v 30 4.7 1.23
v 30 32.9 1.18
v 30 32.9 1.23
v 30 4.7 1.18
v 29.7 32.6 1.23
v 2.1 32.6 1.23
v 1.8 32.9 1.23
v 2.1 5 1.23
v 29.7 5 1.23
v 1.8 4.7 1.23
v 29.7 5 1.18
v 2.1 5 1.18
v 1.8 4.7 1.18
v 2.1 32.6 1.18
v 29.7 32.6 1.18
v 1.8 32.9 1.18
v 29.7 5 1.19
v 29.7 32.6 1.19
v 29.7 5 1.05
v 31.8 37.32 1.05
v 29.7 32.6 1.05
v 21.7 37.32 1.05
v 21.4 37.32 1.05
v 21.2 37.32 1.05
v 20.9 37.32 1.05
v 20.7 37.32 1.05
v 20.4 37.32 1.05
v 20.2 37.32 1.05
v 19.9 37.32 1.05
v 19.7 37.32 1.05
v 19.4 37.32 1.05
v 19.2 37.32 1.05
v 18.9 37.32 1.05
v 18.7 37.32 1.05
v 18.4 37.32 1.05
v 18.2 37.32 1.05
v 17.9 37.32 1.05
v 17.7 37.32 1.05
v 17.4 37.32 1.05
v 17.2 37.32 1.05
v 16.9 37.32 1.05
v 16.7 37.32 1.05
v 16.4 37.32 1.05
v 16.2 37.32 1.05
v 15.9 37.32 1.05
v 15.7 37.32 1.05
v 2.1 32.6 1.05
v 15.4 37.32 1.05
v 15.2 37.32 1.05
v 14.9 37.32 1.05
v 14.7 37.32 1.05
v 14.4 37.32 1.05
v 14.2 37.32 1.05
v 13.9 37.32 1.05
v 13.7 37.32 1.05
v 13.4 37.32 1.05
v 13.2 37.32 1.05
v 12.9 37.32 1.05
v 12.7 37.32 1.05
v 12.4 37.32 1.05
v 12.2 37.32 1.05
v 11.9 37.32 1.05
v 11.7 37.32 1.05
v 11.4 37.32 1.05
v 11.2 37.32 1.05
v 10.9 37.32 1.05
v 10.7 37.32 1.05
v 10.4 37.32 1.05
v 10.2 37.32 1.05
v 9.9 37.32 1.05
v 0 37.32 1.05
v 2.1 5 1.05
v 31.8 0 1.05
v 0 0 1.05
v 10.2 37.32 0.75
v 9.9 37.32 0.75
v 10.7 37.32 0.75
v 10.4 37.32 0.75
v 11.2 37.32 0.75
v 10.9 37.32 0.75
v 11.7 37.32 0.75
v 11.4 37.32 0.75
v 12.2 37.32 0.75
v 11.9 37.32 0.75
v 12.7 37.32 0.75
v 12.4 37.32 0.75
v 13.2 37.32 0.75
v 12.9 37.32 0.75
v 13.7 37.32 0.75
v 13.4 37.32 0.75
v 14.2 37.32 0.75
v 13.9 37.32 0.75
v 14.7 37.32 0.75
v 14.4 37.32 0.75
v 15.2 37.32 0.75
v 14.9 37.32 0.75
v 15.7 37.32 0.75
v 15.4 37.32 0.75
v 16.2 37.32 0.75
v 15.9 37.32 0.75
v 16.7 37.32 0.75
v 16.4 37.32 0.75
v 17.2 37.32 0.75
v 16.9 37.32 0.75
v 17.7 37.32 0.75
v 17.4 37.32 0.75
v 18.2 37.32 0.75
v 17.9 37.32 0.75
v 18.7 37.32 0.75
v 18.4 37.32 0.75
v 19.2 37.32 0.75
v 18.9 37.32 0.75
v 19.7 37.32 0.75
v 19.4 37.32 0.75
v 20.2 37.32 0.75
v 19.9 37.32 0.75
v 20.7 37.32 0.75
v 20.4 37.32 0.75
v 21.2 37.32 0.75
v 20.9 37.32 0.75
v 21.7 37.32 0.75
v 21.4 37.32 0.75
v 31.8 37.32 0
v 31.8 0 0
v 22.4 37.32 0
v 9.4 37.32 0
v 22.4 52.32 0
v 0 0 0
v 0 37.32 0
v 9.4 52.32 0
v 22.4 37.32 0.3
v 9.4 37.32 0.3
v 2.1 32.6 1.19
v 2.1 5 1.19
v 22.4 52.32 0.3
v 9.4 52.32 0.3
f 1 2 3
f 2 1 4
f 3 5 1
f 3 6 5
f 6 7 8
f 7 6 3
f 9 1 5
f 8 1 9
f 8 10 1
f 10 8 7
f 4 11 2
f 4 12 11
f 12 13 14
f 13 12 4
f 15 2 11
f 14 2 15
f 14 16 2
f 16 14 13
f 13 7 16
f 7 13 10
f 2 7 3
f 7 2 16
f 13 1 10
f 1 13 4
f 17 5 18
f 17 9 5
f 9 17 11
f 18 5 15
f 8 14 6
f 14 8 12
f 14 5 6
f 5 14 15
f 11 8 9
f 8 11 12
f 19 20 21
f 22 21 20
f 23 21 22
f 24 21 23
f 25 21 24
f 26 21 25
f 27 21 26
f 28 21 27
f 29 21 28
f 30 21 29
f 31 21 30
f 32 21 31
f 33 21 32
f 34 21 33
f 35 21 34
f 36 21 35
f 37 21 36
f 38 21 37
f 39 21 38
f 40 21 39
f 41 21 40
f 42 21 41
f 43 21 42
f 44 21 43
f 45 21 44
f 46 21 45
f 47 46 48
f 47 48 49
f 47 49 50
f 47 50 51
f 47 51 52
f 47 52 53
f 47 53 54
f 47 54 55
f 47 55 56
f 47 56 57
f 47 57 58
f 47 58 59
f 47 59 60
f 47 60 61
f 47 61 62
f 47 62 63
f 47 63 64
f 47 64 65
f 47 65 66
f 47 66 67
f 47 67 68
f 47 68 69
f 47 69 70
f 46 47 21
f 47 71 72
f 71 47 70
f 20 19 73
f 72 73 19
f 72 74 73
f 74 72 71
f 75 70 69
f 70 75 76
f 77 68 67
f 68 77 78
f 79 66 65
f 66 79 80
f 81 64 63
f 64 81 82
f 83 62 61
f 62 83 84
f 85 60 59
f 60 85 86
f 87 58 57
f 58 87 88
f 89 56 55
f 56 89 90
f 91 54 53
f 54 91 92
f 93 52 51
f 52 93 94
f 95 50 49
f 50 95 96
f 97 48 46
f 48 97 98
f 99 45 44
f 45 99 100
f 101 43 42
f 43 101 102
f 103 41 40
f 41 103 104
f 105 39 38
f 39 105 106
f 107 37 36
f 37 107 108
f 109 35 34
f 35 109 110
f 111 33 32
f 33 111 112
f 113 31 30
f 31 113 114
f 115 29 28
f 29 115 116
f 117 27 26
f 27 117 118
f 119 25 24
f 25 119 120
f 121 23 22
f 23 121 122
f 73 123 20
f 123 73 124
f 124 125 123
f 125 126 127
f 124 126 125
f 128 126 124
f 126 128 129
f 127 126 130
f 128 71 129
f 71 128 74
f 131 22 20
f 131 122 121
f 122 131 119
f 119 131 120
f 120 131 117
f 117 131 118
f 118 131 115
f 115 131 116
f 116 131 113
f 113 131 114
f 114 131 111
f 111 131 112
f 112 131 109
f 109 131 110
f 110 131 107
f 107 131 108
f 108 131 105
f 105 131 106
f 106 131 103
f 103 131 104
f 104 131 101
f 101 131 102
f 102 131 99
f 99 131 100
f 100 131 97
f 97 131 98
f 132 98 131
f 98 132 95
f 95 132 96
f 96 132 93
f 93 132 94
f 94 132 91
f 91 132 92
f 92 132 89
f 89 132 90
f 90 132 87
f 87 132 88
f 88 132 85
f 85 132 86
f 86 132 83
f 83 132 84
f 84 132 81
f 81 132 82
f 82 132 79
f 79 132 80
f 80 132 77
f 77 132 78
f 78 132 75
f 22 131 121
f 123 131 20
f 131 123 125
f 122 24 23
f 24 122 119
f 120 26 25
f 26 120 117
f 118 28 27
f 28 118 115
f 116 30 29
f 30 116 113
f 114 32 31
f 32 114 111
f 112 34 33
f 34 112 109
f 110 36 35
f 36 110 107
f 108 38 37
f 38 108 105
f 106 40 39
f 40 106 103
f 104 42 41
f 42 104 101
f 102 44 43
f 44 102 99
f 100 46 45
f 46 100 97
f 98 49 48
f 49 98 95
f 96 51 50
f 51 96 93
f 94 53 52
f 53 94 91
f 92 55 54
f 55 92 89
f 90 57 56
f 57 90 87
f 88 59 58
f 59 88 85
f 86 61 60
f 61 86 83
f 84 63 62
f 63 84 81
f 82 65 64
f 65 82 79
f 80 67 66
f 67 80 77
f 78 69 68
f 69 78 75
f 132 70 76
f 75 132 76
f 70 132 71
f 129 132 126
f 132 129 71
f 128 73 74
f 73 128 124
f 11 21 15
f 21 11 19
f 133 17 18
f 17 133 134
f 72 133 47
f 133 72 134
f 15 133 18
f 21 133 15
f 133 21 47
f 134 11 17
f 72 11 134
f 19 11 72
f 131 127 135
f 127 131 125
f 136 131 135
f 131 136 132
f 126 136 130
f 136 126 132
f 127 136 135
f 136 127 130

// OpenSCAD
// =============================================================================
// InkTime Smartwatch - E-Paper Display 3D Model
// Component: Waveshare WSH-12561 (1.54" E-Paper Display)
// External Dimensions: 31.80 x 37.32 x 1.05 mm
// Display Active Area: 27.60 x 27.60 mm (200x200 pixels)
// Connector: 24-pin 0.5mm pitch FPC (rear-flip, 2.0H)
// =============================================================================

module display_WSH12561() {
    // External dimensions (mm)
    ext_width  = 31.80;
    ext_height = 37.32;
    ext_depth  = 1.05;
    
    // Active display area (mm)
    disp_width  = 27.60;
    disp_height = 27.60;
    
    // Display offset from edges (centered horizontally, offset vertically)
    disp_x_offset = (ext_width - disp_width) / 2;
    disp_y_offset = 5.0;  // offset from bottom edge
    
    // FPC cable dimensions
    fpc_width  = 13.0;   // 24 pins at 0.5mm pitch + margins
    fpc_length = 15.0;   // cable length extending from panel
    fpc_thick  = 0.3;    // FPC cable thickness
    
    // --- Main panel body ---
    color("DimGray", 0.9)
    cube([ext_width, ext_height, ext_depth]);
    
    // --- Active display area (white e-paper surface) ---
    color("White", 0.95)
    translate([disp_x_offset, disp_y_offset, ext_depth - 0.01])
    cube([disp_width, disp_height, 0.15]);
    
    // --- Thin bezel frame around active area ---
    color("Black", 0.8)
    translate([disp_x_offset - 0.3, disp_y_offset - 0.3, ext_depth + 0.13])
    difference() {
        cube([disp_width + 0.6, disp_height + 0.6, 0.05]);
        translate([0.3, 0.3, -0.1])
        cube([disp_width, disp_height, 0.3]);
    }
    
    // --- FPC cable ---
    color("Orange", 0.7)
    translate([(ext_width - fpc_width) / 2, ext_height, 0])
    cube([fpc_width, fpc_length, fpc_thick]);
    
    // --- FPC connector pads (gold-colored contact strips) ---
    color("Gold")
    translate([(ext_width - fpc_width) / 2 + 0.5, ext_height - 0.5, ext_depth - 0.3])
    for (i = [0:23]) {
        translate([i * 0.5, 0, 0])
        cube([0.3, 0.5, 0.3]);
    }
}

// Render the display
display_WSH12561();
